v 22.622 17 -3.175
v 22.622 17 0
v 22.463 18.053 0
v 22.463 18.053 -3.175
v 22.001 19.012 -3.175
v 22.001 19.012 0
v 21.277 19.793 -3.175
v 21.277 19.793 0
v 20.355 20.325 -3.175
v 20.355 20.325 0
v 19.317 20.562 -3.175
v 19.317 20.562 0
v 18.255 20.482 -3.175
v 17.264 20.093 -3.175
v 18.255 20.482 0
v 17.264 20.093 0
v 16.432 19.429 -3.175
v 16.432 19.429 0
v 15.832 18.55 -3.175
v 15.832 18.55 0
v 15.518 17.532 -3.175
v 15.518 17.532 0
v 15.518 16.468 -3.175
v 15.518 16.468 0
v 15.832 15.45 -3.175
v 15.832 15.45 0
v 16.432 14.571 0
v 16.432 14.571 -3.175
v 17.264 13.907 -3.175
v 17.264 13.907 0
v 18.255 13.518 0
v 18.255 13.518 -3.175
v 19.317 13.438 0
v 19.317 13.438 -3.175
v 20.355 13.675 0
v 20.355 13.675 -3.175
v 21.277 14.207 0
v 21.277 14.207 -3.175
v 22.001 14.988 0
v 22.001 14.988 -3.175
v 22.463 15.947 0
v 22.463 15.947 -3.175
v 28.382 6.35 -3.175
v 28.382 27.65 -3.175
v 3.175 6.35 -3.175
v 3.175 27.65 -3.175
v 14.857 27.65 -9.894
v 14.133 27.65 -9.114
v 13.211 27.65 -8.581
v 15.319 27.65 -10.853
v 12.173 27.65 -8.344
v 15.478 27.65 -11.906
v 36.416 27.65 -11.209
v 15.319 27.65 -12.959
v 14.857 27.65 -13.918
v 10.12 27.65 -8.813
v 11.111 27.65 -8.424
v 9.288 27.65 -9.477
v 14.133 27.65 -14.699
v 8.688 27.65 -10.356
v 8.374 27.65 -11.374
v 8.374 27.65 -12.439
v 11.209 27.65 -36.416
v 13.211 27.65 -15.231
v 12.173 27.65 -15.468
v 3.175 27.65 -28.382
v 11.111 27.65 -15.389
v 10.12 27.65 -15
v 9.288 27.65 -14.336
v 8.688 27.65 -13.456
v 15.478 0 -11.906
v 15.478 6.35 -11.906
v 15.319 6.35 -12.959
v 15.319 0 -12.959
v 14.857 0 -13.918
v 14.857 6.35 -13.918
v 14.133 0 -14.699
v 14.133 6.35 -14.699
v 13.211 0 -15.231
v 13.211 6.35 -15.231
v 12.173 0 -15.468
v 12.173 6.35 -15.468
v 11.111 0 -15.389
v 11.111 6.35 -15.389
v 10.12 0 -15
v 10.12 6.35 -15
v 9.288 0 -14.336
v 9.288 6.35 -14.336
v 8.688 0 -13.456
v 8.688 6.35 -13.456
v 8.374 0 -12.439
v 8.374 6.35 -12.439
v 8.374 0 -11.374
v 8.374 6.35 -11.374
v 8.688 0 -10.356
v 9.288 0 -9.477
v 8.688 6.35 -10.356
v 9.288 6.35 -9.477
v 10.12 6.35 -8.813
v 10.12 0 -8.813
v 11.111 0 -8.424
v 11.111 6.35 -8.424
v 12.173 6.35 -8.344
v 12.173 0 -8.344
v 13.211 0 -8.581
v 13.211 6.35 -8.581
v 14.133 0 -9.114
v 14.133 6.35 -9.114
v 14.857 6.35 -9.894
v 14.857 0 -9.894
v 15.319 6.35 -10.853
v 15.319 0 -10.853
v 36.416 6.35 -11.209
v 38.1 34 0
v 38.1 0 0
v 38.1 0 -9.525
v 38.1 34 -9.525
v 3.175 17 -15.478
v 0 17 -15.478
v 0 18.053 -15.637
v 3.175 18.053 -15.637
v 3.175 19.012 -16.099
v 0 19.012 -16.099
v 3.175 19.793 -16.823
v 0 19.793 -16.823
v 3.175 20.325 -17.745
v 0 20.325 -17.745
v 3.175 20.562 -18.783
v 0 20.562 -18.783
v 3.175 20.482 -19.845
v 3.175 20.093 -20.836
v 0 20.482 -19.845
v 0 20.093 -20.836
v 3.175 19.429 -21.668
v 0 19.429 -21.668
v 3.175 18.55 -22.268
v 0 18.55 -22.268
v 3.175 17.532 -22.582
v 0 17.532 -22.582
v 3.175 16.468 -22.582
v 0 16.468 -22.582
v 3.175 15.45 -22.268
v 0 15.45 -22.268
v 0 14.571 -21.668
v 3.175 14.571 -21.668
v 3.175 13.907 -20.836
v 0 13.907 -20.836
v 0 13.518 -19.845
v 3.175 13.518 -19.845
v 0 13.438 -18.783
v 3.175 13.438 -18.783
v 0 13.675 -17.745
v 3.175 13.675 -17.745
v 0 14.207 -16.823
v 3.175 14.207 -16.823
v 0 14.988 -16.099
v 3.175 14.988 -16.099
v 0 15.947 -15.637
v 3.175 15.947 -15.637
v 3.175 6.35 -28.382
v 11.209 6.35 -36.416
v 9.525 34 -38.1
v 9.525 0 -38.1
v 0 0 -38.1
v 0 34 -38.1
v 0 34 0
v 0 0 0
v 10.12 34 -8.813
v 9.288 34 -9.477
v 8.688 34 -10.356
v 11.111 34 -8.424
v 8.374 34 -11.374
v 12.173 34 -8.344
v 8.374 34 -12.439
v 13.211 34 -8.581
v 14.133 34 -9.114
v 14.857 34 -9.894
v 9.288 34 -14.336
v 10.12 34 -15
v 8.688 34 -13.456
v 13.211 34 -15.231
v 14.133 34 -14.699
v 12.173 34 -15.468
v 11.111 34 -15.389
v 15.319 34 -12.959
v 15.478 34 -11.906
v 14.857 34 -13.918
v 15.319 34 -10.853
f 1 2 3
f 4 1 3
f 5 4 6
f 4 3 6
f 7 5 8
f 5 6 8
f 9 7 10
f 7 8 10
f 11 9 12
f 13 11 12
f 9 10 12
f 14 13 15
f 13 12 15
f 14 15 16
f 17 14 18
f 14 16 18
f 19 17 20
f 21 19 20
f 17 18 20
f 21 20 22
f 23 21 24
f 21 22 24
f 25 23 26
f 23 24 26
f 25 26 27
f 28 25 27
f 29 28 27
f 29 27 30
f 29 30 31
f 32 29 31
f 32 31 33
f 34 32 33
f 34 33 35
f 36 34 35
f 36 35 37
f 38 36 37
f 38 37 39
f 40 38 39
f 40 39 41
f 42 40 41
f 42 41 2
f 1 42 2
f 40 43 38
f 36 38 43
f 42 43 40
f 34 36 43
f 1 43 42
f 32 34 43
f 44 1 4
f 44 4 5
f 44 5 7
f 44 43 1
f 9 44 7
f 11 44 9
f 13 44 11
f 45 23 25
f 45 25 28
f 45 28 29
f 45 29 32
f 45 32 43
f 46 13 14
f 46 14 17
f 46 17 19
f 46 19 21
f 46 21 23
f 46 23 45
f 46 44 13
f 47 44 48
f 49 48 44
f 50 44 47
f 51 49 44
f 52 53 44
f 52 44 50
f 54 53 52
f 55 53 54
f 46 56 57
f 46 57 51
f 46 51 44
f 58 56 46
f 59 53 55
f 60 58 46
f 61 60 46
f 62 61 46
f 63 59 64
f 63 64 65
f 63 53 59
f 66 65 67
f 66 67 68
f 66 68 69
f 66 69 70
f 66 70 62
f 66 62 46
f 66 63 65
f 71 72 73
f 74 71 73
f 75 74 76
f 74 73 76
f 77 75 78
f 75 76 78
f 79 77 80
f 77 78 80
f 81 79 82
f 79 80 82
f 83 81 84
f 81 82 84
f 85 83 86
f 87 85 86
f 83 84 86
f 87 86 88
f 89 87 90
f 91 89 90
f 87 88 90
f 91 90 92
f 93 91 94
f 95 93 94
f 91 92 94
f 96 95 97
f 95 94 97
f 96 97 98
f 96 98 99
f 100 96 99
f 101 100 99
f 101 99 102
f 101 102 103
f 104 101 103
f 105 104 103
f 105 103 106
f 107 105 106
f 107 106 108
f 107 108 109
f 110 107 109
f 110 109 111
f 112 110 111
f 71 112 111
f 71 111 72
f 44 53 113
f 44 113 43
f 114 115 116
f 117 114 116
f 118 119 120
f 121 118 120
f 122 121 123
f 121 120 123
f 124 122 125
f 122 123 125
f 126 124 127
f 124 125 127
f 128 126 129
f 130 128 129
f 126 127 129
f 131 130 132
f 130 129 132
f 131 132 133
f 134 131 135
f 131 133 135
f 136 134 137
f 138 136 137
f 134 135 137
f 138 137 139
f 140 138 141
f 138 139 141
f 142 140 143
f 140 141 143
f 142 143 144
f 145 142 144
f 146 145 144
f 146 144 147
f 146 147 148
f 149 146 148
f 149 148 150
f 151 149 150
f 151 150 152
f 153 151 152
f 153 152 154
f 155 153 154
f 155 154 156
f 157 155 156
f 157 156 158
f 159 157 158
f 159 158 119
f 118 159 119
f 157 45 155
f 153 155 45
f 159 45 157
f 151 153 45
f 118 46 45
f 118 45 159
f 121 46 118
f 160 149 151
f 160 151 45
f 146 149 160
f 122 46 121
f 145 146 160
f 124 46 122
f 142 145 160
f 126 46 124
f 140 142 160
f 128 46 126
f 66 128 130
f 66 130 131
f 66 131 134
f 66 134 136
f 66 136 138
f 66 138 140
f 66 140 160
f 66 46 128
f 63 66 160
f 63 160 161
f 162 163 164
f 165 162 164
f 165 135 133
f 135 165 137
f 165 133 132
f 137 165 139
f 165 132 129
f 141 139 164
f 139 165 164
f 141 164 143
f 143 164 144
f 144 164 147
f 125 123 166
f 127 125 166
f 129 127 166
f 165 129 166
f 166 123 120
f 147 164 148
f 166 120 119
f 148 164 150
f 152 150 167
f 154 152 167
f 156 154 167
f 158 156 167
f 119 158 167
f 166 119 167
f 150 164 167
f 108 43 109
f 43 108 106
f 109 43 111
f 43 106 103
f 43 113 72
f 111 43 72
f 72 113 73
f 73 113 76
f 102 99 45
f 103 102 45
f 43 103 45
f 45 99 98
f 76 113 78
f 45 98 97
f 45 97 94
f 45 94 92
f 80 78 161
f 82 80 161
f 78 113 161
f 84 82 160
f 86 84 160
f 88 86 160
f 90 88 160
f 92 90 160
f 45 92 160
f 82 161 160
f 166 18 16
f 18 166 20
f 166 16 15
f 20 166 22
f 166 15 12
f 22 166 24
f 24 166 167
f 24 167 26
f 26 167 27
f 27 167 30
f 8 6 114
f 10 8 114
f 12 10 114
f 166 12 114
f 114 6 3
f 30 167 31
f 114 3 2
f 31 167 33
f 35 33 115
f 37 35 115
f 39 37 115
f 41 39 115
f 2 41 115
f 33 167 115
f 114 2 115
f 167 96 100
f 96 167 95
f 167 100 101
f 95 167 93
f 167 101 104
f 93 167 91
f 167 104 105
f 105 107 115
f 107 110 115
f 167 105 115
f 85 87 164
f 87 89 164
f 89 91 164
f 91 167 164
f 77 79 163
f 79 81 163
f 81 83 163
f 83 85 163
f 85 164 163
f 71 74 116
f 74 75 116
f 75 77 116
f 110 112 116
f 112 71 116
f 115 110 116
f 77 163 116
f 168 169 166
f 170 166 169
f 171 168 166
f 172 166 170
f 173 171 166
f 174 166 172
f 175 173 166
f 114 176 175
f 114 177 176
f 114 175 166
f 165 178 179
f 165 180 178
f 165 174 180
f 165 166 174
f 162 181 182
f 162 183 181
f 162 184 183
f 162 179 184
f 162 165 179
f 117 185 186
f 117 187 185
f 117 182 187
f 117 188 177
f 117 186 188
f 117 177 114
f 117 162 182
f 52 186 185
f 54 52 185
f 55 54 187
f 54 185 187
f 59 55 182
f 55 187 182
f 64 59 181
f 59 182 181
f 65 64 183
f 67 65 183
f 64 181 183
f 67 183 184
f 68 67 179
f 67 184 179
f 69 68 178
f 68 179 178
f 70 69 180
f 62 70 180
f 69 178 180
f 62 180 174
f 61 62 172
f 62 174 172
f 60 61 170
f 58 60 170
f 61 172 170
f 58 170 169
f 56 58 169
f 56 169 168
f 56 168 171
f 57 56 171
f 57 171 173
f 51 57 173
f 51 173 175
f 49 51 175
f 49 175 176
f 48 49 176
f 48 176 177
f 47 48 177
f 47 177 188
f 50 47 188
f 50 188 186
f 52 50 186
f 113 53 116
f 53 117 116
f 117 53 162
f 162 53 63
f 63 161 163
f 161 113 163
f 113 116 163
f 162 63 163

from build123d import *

# Parameters (mm, degrees)
MAIN_BODY_DEPTH              = 34
SKETCH3_R                    = 3.571875
F_9_32_RIGHT_RAIL_DEPTH      = 1
F_9_32_RIGHT_RAIL_DEPTH_BACK = 39.1
SKETCH4_R                    = 3.571875
F_9_32_LEFT_RAIL_DEPTH       = 34
INNER_HOLLOW_DEPTH           = 21.3
SKETCH6_R                    = 3.571875
F_9_32_TOP_HOLE_DEPTH        = 1
F_9_32_TOP_HOLE_DEPTH_BACK   = 35


with BuildPart() as part:
    # Sketch1 → Main Body (new body)
    with BuildSketch(Plane(origin=(0, 0, 0), x_dir=(1, 0, 0), z_dir=(0, 1, 0))):
        Polygon((0, 0), (38.1, 0), (38.1, 9.525), (9.525, 38.1), (0, 38.1), align=None)
    extrude(amount=MAIN_BODY_DEPTH)

    # Sketch3 → 9/32 Right Rail (cut, two sides)
    with BuildSketch(Plane.XY) as f_9_32_right_rail_sk:
        with Locations((19.05, 17)):
            Circle(SKETCH3_R)
    extrude(amount=F_9_32_RIGHT_RAIL_DEPTH, mode=Mode.SUBTRACT)
    extrude(f_9_32_right_rail_sk.sketch, amount=-F_9_32_RIGHT_RAIL_DEPTH_BACK, mode=Mode.SUBTRACT)

    # Sketch4 → 9/32 Left Rail (cut)
    with BuildSketch(Plane.ZY):
        with Locations((-19.05, 17)):
            Circle(SKETCH4_R)
    extrude(amount=-F_9_32_LEFT_RAIL_DEPTH, mode=Mode.SUBTRACT)

    # Sketch5 → Inner Hollow (cut)
    with BuildSketch(Plane(origin=(0, 27.65, 0), x_dir=(1, 0, 0), z_dir=(0, 1, 0))):
        Polygon((3.175, 28.382403955), (11.208798023, 36.416201977), (36.416201977, 11.208798023), (28.382403955, 3.175), (3.175, 3.175), align=None)
    extrude(amount=-INNER_HOLLOW_DEPTH, mode=Mode.SUBTRACT)

    # Sketch6 → 9/32 Top Hole (cut, two sides)
    with BuildSketch(Plane(origin=(0, 34, 0), x_dir=(1, 0, 0), z_dir=(0, 1, 0))) as f_9_32_top_hole_sk:
        with Locations((11.90625, 11.90625)):
            Circle(SKETCH6_R)
    extrude(amount=F_9_32_TOP_HOLE_DEPTH, mode=Mode.SUBTRACT)
    extrude(f_9_32_top_hole_sk.sketch, amount=-F_9_32_TOP_HOLE_DEPTH_BACK, mode=Mode.SUBTRACT)


solid = part.part
